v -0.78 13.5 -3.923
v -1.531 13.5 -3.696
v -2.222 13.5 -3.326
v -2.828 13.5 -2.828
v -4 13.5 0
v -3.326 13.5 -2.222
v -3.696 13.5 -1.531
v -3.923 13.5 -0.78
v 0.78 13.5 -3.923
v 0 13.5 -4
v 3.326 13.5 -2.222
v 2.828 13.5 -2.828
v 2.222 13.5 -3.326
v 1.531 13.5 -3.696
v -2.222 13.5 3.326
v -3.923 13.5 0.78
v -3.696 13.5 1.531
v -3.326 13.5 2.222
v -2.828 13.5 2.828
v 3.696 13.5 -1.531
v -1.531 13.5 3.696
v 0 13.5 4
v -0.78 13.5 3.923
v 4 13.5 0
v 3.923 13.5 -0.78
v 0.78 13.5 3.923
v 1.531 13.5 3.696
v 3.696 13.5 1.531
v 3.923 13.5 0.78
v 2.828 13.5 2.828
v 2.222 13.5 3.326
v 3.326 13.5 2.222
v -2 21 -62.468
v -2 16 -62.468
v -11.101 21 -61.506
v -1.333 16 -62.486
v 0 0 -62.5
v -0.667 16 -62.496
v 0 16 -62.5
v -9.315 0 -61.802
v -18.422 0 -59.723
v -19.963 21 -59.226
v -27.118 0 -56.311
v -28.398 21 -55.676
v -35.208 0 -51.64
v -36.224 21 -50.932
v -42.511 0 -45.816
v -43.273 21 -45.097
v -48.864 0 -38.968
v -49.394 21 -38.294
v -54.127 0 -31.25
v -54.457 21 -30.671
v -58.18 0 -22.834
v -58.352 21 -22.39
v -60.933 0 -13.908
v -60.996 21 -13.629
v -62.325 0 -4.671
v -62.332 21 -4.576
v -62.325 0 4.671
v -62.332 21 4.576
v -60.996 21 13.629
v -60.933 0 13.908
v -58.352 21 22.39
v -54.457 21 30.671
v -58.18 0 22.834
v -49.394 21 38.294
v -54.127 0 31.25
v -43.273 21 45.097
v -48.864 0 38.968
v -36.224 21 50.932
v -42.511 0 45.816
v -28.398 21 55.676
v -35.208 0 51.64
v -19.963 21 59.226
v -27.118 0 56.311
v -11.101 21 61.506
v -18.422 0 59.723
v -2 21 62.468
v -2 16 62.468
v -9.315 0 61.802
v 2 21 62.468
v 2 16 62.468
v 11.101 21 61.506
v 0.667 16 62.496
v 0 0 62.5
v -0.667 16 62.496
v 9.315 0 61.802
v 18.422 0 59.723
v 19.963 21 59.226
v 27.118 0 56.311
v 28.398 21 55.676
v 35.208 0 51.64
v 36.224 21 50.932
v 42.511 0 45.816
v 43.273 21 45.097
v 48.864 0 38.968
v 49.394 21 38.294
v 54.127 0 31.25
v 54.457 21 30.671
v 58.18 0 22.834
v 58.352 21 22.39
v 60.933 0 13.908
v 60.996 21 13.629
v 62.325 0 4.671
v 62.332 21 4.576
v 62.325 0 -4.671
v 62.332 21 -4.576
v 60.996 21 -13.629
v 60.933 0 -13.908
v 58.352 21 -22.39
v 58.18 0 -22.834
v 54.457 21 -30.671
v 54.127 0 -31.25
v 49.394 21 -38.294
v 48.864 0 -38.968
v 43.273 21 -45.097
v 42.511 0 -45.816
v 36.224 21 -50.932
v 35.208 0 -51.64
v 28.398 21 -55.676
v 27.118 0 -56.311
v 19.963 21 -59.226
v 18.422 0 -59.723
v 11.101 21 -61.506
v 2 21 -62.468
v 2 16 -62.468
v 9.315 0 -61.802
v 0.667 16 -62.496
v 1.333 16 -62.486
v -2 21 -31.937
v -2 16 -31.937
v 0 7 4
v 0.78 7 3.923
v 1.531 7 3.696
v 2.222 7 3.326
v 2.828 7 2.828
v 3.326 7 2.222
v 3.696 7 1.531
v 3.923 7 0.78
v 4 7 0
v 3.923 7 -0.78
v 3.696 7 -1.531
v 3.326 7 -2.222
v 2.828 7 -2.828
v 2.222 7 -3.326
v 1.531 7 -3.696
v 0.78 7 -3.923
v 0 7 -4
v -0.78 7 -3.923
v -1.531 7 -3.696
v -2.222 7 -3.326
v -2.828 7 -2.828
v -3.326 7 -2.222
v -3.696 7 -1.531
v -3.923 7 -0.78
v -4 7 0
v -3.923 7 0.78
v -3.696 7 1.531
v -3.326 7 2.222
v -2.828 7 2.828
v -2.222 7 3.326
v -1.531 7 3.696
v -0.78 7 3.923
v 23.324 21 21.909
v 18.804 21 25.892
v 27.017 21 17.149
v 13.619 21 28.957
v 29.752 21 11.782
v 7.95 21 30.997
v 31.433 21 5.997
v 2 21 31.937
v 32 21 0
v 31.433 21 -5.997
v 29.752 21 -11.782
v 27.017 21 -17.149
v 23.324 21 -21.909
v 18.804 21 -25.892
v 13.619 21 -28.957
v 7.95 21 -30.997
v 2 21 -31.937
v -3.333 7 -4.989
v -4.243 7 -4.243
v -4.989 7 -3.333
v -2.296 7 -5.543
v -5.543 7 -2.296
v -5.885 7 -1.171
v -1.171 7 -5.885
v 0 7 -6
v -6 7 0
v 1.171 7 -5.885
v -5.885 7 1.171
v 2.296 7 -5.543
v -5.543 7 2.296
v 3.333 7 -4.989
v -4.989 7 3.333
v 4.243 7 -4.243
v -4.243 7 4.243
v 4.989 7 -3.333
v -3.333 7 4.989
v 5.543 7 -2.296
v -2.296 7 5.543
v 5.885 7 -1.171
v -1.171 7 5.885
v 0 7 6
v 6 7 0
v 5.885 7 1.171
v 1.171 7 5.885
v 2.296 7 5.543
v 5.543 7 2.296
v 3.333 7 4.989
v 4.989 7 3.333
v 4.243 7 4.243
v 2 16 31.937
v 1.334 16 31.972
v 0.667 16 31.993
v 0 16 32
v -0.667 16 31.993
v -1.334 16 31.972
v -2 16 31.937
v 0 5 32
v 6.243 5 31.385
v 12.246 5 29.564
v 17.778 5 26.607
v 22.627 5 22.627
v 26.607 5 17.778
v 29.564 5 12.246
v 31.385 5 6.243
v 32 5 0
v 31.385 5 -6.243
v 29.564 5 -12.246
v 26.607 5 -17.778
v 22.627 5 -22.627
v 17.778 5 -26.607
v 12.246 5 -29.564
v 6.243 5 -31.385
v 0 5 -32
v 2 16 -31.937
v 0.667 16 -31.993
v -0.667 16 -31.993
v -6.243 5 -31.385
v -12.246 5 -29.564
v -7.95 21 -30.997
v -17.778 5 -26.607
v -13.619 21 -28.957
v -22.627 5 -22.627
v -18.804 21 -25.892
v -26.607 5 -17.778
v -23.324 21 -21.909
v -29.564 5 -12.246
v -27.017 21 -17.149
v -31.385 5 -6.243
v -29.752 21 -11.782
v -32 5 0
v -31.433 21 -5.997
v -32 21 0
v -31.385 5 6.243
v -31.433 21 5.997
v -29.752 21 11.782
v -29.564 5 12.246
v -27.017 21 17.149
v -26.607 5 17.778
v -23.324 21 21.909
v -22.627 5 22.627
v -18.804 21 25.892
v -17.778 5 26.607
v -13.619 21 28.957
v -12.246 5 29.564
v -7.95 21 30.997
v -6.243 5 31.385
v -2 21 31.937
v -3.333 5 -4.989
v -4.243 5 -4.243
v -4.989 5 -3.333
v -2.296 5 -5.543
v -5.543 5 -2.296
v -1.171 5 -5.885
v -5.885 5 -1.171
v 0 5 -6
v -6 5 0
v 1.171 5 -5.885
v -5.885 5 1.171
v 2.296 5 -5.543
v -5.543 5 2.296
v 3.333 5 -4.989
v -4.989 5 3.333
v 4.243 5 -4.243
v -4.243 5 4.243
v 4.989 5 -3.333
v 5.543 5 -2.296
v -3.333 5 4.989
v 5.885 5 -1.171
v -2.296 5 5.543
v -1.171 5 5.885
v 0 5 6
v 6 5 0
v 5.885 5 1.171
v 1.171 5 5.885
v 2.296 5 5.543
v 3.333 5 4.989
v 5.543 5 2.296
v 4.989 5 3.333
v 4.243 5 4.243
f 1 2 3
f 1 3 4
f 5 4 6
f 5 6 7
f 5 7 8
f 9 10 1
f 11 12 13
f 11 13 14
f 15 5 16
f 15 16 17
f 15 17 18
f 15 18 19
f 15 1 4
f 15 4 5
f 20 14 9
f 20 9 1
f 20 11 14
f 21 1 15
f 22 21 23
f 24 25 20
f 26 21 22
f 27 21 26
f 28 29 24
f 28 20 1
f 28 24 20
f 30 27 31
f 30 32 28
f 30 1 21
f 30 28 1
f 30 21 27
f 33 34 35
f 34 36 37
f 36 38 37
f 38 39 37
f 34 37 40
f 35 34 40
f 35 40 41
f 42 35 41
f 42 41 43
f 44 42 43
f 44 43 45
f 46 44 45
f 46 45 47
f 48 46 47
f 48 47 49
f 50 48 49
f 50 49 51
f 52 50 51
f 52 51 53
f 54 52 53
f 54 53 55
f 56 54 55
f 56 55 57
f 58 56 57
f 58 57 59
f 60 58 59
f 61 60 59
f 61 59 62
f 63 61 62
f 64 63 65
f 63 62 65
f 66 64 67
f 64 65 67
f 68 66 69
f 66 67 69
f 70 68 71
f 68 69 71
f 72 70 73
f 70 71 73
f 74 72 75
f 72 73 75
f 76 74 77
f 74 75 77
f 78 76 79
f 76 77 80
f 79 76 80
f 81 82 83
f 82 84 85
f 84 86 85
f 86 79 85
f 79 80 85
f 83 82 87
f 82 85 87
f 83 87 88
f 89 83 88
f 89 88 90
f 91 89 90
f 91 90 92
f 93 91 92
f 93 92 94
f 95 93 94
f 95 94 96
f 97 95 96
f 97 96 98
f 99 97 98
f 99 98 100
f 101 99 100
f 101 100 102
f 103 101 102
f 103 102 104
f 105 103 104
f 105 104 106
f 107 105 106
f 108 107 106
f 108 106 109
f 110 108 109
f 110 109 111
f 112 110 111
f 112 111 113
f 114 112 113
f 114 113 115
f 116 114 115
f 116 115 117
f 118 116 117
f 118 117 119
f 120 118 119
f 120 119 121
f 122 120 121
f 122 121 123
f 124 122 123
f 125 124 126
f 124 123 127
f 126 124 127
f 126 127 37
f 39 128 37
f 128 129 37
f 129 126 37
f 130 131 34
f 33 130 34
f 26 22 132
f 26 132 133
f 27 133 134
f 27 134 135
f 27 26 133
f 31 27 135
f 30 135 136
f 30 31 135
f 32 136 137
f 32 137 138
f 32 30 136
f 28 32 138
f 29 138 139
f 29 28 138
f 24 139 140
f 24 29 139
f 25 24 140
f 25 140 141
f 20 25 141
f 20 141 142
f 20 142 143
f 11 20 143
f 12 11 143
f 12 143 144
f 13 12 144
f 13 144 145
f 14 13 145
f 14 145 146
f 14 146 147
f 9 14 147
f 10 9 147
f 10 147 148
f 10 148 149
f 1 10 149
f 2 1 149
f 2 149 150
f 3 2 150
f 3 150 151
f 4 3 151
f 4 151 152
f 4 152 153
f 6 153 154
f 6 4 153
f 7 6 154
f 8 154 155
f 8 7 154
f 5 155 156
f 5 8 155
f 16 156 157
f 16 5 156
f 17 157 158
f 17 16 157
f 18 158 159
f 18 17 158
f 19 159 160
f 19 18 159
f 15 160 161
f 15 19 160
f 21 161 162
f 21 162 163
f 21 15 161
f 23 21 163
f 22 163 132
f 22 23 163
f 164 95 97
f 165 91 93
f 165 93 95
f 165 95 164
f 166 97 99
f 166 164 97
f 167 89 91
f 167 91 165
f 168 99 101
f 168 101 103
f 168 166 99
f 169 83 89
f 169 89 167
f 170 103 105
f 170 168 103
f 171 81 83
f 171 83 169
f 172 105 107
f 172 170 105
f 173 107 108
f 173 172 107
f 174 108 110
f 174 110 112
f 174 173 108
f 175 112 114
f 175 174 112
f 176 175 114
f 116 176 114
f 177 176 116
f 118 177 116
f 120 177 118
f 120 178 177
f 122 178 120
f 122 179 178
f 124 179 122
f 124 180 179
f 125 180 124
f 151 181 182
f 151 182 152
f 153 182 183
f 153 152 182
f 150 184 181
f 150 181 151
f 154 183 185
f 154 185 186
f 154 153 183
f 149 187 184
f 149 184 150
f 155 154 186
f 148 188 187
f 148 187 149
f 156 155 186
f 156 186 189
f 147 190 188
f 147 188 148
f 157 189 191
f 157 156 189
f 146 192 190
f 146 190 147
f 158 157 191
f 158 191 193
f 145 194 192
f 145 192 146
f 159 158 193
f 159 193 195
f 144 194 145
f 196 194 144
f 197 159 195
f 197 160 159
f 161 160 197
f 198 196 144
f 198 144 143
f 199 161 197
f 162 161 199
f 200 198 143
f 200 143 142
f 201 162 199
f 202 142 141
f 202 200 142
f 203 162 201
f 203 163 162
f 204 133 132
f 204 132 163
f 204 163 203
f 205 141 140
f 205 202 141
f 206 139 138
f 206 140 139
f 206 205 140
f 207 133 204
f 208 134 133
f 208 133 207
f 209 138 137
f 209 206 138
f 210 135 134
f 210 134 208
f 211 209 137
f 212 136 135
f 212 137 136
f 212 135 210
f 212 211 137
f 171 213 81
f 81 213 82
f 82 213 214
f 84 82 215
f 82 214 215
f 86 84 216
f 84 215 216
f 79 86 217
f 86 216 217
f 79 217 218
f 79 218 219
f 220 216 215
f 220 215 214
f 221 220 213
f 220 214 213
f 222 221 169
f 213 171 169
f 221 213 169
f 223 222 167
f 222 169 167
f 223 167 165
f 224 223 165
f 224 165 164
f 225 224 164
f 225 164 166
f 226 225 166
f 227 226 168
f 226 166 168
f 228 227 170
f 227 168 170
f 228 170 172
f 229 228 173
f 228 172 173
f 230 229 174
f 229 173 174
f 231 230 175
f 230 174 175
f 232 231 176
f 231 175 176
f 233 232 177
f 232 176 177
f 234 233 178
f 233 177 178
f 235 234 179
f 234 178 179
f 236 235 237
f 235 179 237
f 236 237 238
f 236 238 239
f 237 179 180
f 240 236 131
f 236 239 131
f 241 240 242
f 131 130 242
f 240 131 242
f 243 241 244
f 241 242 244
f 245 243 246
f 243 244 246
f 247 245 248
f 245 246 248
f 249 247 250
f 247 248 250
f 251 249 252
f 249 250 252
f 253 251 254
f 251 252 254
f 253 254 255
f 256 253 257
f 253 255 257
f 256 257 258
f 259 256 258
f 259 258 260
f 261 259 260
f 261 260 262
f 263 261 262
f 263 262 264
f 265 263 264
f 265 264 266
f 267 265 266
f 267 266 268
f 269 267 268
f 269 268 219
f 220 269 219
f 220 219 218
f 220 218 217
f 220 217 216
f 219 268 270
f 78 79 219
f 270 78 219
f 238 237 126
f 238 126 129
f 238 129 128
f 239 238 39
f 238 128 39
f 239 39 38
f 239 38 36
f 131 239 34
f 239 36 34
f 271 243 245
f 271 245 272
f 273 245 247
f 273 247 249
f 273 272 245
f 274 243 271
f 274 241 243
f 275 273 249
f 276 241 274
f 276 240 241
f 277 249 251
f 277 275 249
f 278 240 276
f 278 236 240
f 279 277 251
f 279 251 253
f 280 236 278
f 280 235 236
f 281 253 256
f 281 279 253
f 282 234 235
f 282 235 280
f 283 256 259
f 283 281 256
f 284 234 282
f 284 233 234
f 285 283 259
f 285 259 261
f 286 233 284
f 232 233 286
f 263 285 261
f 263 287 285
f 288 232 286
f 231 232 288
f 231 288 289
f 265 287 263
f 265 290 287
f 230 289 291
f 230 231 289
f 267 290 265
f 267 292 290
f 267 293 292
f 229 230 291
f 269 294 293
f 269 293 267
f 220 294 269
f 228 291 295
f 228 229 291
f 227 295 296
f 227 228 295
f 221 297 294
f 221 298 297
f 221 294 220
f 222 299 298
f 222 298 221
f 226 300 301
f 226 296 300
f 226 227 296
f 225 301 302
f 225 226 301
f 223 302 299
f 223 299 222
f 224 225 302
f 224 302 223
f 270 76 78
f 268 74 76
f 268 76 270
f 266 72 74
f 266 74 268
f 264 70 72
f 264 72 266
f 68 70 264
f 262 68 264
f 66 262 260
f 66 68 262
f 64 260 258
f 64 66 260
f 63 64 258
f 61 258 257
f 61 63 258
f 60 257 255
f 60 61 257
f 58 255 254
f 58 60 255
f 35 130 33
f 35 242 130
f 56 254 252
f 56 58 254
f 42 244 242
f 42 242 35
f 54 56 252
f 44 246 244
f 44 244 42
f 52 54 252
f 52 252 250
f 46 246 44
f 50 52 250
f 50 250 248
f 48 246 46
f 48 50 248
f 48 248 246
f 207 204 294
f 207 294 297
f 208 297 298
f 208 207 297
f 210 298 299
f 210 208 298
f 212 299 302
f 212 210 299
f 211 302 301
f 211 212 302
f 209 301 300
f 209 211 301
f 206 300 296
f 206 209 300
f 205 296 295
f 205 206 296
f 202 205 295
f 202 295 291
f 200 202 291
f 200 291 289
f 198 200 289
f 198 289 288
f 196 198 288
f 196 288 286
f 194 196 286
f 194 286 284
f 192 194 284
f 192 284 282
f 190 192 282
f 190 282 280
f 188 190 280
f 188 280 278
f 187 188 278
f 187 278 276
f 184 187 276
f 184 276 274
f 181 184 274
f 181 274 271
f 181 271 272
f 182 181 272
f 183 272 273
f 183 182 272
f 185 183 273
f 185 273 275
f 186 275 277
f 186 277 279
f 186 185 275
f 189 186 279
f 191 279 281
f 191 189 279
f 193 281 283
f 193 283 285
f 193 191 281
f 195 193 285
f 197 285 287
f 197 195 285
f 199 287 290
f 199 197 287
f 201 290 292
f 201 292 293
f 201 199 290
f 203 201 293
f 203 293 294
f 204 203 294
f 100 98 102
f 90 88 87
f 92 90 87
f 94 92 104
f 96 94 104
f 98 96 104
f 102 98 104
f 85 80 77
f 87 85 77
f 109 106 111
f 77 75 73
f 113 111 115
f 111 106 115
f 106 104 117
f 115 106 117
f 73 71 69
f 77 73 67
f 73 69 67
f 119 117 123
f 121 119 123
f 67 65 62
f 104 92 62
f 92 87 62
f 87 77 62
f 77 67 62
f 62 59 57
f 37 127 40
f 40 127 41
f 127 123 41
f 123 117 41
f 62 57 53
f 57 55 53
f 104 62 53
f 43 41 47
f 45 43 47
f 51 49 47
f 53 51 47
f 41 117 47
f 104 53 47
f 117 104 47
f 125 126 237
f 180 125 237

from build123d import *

# Parameters (mm, degrees)
SKETCH1_R           = 62.5
BOSS_EXTRUDE1_DEPTH = 21
SKETCH2_R           = 32
SKETCH2_R_2         = 6
CUT_EXTRUDE1_DEPTH  = 16
SKETCH3_R           = 6
SKETCH3_R_2         = 4
CUT_EXTRUDE2_DEPTH  = 14
SKETCH4_R           = 4
CUT_EXTRUDE3_DEPTH  = 7.5
CUT_EXTRUDE4_START  = -5
CUT_EXTRUDE4_DEPTH  = 5


with BuildPart() as part:
    # Sketch1 → Boss-Extrude1 (new body)
    with BuildSketch(Plane(origin=(0, 0, 0), x_dir=(1, 0, 0), z_dir=(0, 1, 0))):
        with Locations(Location((0, 0, 0), (0, 0, 90))):
            Circle(SKETCH1_R)
    extrude(amount=BOSS_EXTRUDE1_DEPTH)

    # Sketch2 → Cut-Extrude1 (cut)
    with BuildSketch(Plane(origin=(0, 21, 0), x_dir=(1, 0, 0), z_dir=(0, 1, 0))):
        with Locations(Location((0, 0, 0), (0, 0, 270))):
            Circle(SKETCH2_R)
        with Locations(Location((0, 0, 0), (0, 0, 270))):
            Circle(SKETCH2_R_2, mode=Mode.SUBTRACT)
    extrude(amount=-CUT_EXTRUDE1_DEPTH, mode=Mode.SUBTRACT)

    # Sketch3 → Cut-Extrude2 (cut)
    with BuildSketch(Plane(origin=(0, 21, 0), x_dir=(1, 0, 0), z_dir=(0, 1, 0))):
        with Locations(Location((0, 0, 0), (0, 0, 270))):
            Circle(SKETCH3_R)
        with Locations(Location((0, 0, 0), (0, 0, 270))):
            Circle(SKETCH3_R_2, mode=Mode.SUBTRACT)
    extrude(amount=-CUT_EXTRUDE2_DEPTH, mode=Mode.SUBTRACT)

    # Sketch4 → Cut-Extrude3 (cut)
    with BuildSketch(Plane(origin=(0, 21, 0), x_dir=(1, 0, 0), z_dir=(0, 1, 0))):
        with Locations(Location((0, 0, 0), (0, 0, 270))):
            Circle(SKETCH4_R)
    extrude(amount=-CUT_EXTRUDE3_DEPTH, mode=Mode.SUBTRACT)

    # Sketch5 → Cut-Extrude4 (cut)
    with BuildSketch(Plane(origin=(0, 21, 0), x_dir=(1, 0, 0), z_dir=(0, 1, 0)).offset(CUT_EXTRUDE4_START)):
        with BuildLine():
            Line((2, 62.467991804), (2, -62.467991804))
            ThreePointArc((2, -62.467991804), (0, -62.5), (-2, -62.467991804))
            Line((-2, -62.467991804), (-2, 62.467991804))
            ThreePointArc((-2, 62.467991804), (0, 62.5), (2, 62.467991804))
        make_face()
    extrude(amount=CUT_EXTRUDE4_DEPTH, mode=Mode.SUBTRACT)


solid = part.part
